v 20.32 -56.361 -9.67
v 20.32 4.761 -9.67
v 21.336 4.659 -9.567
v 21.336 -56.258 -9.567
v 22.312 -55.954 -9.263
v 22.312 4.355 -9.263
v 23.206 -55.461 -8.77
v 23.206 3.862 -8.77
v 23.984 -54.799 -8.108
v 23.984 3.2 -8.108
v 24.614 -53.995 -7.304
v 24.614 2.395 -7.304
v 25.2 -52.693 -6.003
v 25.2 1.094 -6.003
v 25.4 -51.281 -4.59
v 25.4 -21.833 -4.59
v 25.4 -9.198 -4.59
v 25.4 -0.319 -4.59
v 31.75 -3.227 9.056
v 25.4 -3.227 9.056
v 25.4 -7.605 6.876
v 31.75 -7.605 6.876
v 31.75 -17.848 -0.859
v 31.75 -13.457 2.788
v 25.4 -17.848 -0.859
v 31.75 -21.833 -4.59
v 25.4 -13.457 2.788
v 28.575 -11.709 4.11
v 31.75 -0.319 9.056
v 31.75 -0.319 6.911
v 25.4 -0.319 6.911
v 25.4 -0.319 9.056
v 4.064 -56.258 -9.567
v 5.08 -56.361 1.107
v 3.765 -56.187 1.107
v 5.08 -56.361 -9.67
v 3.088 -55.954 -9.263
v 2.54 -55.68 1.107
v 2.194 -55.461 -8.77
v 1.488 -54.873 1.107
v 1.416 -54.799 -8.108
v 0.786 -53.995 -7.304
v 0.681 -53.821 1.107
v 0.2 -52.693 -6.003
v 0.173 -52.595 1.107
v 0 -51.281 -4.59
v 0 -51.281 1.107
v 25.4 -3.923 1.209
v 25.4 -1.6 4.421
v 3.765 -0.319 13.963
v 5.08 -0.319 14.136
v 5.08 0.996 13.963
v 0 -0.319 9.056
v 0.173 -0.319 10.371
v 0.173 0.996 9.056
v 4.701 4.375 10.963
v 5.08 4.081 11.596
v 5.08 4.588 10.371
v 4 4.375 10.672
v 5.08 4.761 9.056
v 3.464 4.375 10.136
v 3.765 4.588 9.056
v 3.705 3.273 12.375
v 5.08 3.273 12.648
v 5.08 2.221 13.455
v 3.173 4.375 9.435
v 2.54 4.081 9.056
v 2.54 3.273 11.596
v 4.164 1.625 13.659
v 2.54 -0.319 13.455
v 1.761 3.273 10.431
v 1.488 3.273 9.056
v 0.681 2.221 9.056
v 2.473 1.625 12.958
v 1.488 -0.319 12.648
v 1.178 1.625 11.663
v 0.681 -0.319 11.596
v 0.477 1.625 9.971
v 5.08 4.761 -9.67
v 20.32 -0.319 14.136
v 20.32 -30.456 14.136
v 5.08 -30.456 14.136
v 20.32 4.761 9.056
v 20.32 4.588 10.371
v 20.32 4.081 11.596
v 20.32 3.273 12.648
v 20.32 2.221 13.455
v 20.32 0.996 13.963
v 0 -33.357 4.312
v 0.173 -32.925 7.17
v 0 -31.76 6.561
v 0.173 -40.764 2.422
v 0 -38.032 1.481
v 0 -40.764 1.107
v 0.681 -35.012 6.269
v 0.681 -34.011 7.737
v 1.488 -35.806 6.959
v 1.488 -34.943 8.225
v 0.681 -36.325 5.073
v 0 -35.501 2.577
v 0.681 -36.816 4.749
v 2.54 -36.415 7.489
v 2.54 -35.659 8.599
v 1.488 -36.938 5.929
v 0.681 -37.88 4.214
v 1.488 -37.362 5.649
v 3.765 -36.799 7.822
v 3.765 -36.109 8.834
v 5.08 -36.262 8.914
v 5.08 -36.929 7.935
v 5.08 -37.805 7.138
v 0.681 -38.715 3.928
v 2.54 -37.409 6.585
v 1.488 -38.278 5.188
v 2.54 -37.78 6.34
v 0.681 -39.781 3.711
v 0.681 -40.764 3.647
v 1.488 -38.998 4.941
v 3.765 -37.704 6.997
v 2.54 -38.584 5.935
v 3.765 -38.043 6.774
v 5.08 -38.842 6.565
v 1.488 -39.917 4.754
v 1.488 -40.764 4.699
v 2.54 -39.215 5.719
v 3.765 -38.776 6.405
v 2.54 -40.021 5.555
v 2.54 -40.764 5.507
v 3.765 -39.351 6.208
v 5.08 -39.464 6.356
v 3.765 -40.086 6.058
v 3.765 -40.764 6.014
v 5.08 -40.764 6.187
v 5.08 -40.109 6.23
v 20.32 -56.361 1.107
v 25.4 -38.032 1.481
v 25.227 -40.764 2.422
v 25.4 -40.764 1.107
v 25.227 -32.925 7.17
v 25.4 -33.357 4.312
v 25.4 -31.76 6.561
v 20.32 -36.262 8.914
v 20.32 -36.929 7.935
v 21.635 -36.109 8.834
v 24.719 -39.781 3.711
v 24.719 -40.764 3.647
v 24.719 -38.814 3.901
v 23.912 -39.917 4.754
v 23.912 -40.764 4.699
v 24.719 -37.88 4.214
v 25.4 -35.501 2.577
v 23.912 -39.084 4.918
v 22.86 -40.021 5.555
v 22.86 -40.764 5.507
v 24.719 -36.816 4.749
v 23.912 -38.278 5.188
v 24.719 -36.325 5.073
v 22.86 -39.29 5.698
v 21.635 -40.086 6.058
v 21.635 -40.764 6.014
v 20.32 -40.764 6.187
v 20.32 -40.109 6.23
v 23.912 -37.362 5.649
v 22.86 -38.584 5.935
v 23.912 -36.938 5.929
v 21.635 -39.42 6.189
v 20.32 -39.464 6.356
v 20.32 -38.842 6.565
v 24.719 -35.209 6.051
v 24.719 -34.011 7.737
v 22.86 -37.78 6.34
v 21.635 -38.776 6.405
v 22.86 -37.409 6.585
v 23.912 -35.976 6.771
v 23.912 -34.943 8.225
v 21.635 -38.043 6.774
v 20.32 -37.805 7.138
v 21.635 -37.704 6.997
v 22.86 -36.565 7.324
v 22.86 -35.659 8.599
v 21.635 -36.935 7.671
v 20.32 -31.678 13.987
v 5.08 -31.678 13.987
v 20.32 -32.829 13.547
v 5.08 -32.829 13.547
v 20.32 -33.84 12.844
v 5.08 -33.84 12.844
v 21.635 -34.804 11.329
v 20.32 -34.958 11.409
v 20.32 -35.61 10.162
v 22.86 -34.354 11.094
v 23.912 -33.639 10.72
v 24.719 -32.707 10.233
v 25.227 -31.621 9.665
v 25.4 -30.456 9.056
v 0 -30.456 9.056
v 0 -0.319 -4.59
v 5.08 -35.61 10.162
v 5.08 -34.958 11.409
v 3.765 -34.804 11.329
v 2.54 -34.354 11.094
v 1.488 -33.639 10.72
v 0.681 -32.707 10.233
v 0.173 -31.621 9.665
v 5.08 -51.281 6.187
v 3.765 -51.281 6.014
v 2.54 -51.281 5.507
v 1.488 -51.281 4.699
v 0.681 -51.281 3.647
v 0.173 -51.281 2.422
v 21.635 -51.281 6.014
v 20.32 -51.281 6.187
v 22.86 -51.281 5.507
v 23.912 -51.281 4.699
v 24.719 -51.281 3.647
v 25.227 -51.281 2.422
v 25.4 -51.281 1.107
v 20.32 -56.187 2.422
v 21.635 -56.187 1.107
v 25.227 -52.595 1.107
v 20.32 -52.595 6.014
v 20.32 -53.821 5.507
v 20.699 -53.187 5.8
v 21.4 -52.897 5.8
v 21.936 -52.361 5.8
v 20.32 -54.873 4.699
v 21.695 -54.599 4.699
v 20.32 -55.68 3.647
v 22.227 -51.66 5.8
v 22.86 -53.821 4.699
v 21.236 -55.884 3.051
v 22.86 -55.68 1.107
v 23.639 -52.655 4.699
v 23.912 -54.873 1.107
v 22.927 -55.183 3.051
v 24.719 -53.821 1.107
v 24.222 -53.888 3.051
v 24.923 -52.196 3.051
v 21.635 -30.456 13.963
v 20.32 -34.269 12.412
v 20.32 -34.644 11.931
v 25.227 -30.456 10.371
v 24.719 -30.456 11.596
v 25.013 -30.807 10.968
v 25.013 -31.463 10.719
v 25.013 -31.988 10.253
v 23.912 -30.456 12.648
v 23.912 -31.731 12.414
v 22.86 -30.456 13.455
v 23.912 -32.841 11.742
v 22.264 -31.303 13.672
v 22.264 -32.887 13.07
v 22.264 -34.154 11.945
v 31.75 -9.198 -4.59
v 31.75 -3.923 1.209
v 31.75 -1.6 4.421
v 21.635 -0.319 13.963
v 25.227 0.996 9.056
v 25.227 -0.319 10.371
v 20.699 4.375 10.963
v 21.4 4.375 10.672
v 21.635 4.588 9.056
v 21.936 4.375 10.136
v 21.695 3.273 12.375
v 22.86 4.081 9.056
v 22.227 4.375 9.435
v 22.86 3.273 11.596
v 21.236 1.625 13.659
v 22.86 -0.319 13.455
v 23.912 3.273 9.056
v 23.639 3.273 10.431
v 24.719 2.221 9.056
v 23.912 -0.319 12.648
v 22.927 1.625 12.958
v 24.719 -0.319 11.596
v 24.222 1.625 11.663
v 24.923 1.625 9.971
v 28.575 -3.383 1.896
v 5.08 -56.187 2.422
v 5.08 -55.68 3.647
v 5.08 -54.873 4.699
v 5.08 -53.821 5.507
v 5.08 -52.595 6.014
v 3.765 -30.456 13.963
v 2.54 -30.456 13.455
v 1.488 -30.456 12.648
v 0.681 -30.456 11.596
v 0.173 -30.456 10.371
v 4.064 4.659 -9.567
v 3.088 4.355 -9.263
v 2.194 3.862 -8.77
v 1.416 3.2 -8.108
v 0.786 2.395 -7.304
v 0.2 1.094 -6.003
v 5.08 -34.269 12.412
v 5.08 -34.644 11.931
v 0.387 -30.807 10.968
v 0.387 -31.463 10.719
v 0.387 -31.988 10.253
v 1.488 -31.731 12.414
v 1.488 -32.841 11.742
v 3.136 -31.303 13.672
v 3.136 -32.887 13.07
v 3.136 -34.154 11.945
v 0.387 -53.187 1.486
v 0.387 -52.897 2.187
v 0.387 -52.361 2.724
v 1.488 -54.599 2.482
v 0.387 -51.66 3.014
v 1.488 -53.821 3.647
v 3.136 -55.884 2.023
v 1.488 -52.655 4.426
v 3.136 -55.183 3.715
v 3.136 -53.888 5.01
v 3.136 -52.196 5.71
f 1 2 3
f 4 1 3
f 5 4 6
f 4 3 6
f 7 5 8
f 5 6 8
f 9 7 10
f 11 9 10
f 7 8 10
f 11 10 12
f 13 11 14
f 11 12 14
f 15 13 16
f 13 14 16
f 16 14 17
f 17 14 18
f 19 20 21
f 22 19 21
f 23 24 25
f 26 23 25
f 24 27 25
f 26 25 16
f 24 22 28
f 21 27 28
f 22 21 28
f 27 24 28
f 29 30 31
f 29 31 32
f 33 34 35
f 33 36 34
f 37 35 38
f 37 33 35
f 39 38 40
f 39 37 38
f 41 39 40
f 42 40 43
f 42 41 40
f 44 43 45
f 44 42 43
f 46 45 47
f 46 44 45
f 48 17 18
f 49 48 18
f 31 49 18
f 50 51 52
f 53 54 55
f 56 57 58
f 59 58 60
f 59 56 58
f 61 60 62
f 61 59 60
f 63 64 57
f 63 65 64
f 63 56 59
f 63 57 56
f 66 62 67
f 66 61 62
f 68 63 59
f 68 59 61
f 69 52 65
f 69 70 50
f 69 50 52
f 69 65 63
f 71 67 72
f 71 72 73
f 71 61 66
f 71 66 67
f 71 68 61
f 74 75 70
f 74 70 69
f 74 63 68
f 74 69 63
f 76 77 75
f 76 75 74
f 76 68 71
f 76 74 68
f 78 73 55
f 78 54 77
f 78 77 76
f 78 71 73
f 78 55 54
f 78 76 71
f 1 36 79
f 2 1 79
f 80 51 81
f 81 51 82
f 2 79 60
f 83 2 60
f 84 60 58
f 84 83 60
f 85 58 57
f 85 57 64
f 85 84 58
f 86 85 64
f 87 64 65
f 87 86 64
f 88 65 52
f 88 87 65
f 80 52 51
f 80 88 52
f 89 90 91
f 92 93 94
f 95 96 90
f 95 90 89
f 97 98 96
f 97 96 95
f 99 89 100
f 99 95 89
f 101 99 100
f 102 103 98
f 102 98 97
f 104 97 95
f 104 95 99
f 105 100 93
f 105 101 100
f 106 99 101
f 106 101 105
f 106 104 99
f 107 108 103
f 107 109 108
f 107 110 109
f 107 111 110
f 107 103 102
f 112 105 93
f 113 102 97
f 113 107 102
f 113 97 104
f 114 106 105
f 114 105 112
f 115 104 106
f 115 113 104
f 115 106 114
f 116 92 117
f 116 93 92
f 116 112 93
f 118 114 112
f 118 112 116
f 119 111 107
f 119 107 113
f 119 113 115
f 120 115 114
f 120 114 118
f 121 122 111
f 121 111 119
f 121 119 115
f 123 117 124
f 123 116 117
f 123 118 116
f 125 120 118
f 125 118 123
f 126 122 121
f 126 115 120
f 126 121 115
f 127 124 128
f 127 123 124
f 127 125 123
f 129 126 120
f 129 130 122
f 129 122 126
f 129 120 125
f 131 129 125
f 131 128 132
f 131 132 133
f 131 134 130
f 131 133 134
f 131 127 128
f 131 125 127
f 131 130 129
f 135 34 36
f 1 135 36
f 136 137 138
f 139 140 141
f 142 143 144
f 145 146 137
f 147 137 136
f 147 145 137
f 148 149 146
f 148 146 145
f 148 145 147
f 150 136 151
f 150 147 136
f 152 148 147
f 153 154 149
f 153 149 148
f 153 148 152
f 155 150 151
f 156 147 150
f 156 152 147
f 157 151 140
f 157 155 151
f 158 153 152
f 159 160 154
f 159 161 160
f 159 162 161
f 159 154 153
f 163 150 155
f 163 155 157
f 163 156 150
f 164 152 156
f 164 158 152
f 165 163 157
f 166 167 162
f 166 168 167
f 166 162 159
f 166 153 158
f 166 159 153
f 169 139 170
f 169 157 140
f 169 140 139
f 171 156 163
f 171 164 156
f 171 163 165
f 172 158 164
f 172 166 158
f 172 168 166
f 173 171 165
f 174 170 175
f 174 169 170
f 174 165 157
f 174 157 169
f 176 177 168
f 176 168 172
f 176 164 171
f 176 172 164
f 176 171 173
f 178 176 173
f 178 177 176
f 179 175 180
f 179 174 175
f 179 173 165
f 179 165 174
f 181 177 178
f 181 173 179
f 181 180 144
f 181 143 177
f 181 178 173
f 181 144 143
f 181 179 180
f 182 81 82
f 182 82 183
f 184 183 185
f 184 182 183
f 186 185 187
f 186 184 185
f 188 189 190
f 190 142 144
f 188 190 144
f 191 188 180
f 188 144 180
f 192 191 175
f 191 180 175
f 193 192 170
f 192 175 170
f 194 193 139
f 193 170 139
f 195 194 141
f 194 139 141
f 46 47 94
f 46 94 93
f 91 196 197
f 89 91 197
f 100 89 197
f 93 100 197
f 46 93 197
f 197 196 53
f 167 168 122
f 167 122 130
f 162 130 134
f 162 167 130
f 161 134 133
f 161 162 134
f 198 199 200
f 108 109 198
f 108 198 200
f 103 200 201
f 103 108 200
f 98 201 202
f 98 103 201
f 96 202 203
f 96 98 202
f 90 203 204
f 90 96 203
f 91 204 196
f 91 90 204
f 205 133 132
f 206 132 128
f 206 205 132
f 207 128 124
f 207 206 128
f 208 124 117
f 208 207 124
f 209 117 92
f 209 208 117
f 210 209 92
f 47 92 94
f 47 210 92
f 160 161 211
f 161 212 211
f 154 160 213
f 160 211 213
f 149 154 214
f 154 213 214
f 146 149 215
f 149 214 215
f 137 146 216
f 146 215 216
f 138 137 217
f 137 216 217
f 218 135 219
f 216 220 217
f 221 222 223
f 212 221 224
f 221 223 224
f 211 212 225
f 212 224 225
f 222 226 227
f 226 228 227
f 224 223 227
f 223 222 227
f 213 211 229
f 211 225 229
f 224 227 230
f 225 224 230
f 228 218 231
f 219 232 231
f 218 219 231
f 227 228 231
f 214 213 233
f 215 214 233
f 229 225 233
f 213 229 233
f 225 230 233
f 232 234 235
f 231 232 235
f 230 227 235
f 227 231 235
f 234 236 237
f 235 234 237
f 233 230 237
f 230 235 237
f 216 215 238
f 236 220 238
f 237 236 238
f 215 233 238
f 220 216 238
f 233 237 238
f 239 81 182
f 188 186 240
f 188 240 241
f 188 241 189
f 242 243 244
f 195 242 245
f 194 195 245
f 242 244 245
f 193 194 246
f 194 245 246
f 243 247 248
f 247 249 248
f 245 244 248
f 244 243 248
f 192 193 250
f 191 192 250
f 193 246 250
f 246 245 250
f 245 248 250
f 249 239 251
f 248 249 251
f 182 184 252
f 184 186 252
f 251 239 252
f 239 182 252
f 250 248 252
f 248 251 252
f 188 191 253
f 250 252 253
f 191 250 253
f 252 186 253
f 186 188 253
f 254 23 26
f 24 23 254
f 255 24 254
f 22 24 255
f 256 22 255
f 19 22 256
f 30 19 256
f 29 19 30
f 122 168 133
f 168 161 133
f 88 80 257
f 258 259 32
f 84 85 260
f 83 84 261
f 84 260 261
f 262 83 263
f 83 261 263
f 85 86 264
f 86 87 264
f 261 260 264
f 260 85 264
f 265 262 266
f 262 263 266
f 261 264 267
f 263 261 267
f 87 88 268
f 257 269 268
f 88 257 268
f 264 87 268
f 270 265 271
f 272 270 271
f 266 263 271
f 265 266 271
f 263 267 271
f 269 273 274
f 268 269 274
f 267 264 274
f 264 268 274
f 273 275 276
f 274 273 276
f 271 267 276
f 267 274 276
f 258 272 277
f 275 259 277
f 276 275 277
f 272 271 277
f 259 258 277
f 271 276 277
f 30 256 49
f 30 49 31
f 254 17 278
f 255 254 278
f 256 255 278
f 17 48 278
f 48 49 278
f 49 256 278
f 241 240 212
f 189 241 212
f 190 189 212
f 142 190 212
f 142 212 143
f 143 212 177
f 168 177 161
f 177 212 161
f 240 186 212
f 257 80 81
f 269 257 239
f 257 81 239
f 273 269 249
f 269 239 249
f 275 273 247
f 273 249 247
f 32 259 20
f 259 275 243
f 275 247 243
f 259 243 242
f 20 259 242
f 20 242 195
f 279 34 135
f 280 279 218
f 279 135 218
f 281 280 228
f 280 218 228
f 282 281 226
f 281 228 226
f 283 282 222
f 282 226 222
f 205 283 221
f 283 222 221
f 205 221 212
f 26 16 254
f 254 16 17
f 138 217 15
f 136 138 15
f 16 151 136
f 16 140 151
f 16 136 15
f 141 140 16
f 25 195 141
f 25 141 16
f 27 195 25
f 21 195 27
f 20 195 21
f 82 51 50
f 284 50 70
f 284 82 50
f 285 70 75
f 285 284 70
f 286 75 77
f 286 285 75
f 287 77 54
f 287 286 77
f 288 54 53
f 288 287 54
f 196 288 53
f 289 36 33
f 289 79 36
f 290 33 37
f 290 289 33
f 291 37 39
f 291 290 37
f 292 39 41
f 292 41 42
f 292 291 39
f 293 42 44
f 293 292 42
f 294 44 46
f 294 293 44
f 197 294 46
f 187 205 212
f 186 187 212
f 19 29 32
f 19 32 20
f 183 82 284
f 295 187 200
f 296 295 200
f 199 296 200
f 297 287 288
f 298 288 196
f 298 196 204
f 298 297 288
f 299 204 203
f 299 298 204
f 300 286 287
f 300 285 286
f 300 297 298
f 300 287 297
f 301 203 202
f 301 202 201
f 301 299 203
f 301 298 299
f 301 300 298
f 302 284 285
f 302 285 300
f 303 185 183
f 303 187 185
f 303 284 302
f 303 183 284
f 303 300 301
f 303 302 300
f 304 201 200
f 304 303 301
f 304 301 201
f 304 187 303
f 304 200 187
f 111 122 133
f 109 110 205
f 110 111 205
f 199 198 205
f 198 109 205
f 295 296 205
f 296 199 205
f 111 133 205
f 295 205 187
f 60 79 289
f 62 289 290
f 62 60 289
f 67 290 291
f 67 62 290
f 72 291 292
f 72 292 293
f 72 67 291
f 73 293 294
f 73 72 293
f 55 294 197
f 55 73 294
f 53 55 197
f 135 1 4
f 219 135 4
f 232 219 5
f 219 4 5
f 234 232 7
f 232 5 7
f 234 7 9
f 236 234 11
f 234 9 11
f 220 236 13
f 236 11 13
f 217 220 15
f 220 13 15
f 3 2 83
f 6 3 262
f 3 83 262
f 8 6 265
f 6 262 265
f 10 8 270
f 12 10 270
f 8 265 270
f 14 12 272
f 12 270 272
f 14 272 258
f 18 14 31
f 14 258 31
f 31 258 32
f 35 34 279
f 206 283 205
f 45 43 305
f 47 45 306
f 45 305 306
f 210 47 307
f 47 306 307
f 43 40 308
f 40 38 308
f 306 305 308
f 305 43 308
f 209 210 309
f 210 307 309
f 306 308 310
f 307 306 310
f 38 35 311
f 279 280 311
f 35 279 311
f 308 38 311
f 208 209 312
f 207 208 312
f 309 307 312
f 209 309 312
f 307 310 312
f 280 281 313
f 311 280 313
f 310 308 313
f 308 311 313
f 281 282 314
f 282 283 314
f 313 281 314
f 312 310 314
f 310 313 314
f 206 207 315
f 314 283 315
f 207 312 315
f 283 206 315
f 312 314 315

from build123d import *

# Parameters (mm, degrees)
F1_DEPTH   = 25.4
F2_R       = 5.08
F1_FACE_W  = 15.24
F1_FACE_H  = 30.1367967168
F1_FACE1_W = 15.24
F1_FACE1_H = 10.5165233221
F5_DEPTH   = 6.35


with BuildPart() as f1:
    # F0 (on Right) → F1 (new body)
    with BuildSketch(Plane.YZ):
        Polygon((-56.3605315983, 6.1871875077), (-56.3605315983, -9.6700796857), (4.7612222843, -9.6700796857), (4.7612222843, 6.1871875077), (4.7612222843, 14.1358673573), (-33.5322959741, 14.1358673573), (-37.6872867346, 6.1871875077), align=None)
    extrude(amount=F1_DEPTH)

    # F2
    f2_edges = [f1.edges().sort_by_distance(p)[0] for p in [
        (25.4, -56.360532, -1.741446),
        (12.7, -56.360532, 6.187188),
        (0, -56.360532, -1.741446),
        (25.4, -47.023909, 6.187188),
        (25.4, -35.609791, 10.161527),
        (12.7, -33.532296, 14.135867),
        (12.7, -37.687287, 6.187188),
        (25.4, -14.385537, 14.135867),
        (0, -14.385537, 14.135867),
        (12.7, 4.761222, 14.135867),
        (25.4, 4.761222, 2.232894),
        (25.4, -25.799655, -9.67008),
        (0, 4.761222, 2.232894),
        (0, -25.799655, -9.67008),
        (0, -35.609791, 10.161527),
        (0, -47.023909, 6.187188),
    ]]
    fillet(f2_edges, radius=F2_R)

    # F1_face (on face) → F3 section 0
    with BuildSketch(Plane(origin=(12.7, -15.3871760741, 14.1358673573), x_dir=(1, 0, 0), z_dir=(0, 0, 1))):
        Rectangle(F1_FACE_W, F1_FACE_H)
    # F1_face1 (on face) → F3 section 1
    with BuildSketch(Plane(origin=(12.7, -46.0222699373, 6.1871875077), x_dir=(1, 0, 0), z_dir=(0, 0, 1))):
        Rectangle(F1_FACE1_W, F1_FACE1_H)
    loft()

    # F4 (on face) → F5 (join)
    with BuildSketch(Plane.YZ.offset(25.4)):
        with BuildLine():
            Line((-0.3187777157, 9.0558673573), (-3.2266356666, 9.0558673573))
            add(Edge.make_bspline(
                [(-3.2266356666, 9.0558673573), (-10.6613118154, 6.5028903713), (-21.8331213212, -4.5900796857)],
                knots=[0.4644506535, 0.4644506535, 0.4644506535, 1.8030216535, 1.8030216535, 1.8030216535], degree=2, weights=[1, 0.7842651602, 1]))
            Line((-21.8331213212, -4.5900796857), (-9.1981538469, -4.5900796857))
            add(Edge.make_bspline(
                [(-9.1981538469, -4.5900796857), (-1.8305878019, 2.7254934529), (-0.3187777157, 6.9107739232)],
                knots=[4.9446143071, 4.9446143071, 4.9446143071, 5.9063398106, 5.9063398106, 5.9063398106], degree=2, weights=[1, 0.8865961919, 1]))
            Line((-0.3187777157, 6.9107739232), (-0.3187777157, 9.0558673573))
        make_face()
    extrude(amount=F5_DEPTH)


solid = f1.part
